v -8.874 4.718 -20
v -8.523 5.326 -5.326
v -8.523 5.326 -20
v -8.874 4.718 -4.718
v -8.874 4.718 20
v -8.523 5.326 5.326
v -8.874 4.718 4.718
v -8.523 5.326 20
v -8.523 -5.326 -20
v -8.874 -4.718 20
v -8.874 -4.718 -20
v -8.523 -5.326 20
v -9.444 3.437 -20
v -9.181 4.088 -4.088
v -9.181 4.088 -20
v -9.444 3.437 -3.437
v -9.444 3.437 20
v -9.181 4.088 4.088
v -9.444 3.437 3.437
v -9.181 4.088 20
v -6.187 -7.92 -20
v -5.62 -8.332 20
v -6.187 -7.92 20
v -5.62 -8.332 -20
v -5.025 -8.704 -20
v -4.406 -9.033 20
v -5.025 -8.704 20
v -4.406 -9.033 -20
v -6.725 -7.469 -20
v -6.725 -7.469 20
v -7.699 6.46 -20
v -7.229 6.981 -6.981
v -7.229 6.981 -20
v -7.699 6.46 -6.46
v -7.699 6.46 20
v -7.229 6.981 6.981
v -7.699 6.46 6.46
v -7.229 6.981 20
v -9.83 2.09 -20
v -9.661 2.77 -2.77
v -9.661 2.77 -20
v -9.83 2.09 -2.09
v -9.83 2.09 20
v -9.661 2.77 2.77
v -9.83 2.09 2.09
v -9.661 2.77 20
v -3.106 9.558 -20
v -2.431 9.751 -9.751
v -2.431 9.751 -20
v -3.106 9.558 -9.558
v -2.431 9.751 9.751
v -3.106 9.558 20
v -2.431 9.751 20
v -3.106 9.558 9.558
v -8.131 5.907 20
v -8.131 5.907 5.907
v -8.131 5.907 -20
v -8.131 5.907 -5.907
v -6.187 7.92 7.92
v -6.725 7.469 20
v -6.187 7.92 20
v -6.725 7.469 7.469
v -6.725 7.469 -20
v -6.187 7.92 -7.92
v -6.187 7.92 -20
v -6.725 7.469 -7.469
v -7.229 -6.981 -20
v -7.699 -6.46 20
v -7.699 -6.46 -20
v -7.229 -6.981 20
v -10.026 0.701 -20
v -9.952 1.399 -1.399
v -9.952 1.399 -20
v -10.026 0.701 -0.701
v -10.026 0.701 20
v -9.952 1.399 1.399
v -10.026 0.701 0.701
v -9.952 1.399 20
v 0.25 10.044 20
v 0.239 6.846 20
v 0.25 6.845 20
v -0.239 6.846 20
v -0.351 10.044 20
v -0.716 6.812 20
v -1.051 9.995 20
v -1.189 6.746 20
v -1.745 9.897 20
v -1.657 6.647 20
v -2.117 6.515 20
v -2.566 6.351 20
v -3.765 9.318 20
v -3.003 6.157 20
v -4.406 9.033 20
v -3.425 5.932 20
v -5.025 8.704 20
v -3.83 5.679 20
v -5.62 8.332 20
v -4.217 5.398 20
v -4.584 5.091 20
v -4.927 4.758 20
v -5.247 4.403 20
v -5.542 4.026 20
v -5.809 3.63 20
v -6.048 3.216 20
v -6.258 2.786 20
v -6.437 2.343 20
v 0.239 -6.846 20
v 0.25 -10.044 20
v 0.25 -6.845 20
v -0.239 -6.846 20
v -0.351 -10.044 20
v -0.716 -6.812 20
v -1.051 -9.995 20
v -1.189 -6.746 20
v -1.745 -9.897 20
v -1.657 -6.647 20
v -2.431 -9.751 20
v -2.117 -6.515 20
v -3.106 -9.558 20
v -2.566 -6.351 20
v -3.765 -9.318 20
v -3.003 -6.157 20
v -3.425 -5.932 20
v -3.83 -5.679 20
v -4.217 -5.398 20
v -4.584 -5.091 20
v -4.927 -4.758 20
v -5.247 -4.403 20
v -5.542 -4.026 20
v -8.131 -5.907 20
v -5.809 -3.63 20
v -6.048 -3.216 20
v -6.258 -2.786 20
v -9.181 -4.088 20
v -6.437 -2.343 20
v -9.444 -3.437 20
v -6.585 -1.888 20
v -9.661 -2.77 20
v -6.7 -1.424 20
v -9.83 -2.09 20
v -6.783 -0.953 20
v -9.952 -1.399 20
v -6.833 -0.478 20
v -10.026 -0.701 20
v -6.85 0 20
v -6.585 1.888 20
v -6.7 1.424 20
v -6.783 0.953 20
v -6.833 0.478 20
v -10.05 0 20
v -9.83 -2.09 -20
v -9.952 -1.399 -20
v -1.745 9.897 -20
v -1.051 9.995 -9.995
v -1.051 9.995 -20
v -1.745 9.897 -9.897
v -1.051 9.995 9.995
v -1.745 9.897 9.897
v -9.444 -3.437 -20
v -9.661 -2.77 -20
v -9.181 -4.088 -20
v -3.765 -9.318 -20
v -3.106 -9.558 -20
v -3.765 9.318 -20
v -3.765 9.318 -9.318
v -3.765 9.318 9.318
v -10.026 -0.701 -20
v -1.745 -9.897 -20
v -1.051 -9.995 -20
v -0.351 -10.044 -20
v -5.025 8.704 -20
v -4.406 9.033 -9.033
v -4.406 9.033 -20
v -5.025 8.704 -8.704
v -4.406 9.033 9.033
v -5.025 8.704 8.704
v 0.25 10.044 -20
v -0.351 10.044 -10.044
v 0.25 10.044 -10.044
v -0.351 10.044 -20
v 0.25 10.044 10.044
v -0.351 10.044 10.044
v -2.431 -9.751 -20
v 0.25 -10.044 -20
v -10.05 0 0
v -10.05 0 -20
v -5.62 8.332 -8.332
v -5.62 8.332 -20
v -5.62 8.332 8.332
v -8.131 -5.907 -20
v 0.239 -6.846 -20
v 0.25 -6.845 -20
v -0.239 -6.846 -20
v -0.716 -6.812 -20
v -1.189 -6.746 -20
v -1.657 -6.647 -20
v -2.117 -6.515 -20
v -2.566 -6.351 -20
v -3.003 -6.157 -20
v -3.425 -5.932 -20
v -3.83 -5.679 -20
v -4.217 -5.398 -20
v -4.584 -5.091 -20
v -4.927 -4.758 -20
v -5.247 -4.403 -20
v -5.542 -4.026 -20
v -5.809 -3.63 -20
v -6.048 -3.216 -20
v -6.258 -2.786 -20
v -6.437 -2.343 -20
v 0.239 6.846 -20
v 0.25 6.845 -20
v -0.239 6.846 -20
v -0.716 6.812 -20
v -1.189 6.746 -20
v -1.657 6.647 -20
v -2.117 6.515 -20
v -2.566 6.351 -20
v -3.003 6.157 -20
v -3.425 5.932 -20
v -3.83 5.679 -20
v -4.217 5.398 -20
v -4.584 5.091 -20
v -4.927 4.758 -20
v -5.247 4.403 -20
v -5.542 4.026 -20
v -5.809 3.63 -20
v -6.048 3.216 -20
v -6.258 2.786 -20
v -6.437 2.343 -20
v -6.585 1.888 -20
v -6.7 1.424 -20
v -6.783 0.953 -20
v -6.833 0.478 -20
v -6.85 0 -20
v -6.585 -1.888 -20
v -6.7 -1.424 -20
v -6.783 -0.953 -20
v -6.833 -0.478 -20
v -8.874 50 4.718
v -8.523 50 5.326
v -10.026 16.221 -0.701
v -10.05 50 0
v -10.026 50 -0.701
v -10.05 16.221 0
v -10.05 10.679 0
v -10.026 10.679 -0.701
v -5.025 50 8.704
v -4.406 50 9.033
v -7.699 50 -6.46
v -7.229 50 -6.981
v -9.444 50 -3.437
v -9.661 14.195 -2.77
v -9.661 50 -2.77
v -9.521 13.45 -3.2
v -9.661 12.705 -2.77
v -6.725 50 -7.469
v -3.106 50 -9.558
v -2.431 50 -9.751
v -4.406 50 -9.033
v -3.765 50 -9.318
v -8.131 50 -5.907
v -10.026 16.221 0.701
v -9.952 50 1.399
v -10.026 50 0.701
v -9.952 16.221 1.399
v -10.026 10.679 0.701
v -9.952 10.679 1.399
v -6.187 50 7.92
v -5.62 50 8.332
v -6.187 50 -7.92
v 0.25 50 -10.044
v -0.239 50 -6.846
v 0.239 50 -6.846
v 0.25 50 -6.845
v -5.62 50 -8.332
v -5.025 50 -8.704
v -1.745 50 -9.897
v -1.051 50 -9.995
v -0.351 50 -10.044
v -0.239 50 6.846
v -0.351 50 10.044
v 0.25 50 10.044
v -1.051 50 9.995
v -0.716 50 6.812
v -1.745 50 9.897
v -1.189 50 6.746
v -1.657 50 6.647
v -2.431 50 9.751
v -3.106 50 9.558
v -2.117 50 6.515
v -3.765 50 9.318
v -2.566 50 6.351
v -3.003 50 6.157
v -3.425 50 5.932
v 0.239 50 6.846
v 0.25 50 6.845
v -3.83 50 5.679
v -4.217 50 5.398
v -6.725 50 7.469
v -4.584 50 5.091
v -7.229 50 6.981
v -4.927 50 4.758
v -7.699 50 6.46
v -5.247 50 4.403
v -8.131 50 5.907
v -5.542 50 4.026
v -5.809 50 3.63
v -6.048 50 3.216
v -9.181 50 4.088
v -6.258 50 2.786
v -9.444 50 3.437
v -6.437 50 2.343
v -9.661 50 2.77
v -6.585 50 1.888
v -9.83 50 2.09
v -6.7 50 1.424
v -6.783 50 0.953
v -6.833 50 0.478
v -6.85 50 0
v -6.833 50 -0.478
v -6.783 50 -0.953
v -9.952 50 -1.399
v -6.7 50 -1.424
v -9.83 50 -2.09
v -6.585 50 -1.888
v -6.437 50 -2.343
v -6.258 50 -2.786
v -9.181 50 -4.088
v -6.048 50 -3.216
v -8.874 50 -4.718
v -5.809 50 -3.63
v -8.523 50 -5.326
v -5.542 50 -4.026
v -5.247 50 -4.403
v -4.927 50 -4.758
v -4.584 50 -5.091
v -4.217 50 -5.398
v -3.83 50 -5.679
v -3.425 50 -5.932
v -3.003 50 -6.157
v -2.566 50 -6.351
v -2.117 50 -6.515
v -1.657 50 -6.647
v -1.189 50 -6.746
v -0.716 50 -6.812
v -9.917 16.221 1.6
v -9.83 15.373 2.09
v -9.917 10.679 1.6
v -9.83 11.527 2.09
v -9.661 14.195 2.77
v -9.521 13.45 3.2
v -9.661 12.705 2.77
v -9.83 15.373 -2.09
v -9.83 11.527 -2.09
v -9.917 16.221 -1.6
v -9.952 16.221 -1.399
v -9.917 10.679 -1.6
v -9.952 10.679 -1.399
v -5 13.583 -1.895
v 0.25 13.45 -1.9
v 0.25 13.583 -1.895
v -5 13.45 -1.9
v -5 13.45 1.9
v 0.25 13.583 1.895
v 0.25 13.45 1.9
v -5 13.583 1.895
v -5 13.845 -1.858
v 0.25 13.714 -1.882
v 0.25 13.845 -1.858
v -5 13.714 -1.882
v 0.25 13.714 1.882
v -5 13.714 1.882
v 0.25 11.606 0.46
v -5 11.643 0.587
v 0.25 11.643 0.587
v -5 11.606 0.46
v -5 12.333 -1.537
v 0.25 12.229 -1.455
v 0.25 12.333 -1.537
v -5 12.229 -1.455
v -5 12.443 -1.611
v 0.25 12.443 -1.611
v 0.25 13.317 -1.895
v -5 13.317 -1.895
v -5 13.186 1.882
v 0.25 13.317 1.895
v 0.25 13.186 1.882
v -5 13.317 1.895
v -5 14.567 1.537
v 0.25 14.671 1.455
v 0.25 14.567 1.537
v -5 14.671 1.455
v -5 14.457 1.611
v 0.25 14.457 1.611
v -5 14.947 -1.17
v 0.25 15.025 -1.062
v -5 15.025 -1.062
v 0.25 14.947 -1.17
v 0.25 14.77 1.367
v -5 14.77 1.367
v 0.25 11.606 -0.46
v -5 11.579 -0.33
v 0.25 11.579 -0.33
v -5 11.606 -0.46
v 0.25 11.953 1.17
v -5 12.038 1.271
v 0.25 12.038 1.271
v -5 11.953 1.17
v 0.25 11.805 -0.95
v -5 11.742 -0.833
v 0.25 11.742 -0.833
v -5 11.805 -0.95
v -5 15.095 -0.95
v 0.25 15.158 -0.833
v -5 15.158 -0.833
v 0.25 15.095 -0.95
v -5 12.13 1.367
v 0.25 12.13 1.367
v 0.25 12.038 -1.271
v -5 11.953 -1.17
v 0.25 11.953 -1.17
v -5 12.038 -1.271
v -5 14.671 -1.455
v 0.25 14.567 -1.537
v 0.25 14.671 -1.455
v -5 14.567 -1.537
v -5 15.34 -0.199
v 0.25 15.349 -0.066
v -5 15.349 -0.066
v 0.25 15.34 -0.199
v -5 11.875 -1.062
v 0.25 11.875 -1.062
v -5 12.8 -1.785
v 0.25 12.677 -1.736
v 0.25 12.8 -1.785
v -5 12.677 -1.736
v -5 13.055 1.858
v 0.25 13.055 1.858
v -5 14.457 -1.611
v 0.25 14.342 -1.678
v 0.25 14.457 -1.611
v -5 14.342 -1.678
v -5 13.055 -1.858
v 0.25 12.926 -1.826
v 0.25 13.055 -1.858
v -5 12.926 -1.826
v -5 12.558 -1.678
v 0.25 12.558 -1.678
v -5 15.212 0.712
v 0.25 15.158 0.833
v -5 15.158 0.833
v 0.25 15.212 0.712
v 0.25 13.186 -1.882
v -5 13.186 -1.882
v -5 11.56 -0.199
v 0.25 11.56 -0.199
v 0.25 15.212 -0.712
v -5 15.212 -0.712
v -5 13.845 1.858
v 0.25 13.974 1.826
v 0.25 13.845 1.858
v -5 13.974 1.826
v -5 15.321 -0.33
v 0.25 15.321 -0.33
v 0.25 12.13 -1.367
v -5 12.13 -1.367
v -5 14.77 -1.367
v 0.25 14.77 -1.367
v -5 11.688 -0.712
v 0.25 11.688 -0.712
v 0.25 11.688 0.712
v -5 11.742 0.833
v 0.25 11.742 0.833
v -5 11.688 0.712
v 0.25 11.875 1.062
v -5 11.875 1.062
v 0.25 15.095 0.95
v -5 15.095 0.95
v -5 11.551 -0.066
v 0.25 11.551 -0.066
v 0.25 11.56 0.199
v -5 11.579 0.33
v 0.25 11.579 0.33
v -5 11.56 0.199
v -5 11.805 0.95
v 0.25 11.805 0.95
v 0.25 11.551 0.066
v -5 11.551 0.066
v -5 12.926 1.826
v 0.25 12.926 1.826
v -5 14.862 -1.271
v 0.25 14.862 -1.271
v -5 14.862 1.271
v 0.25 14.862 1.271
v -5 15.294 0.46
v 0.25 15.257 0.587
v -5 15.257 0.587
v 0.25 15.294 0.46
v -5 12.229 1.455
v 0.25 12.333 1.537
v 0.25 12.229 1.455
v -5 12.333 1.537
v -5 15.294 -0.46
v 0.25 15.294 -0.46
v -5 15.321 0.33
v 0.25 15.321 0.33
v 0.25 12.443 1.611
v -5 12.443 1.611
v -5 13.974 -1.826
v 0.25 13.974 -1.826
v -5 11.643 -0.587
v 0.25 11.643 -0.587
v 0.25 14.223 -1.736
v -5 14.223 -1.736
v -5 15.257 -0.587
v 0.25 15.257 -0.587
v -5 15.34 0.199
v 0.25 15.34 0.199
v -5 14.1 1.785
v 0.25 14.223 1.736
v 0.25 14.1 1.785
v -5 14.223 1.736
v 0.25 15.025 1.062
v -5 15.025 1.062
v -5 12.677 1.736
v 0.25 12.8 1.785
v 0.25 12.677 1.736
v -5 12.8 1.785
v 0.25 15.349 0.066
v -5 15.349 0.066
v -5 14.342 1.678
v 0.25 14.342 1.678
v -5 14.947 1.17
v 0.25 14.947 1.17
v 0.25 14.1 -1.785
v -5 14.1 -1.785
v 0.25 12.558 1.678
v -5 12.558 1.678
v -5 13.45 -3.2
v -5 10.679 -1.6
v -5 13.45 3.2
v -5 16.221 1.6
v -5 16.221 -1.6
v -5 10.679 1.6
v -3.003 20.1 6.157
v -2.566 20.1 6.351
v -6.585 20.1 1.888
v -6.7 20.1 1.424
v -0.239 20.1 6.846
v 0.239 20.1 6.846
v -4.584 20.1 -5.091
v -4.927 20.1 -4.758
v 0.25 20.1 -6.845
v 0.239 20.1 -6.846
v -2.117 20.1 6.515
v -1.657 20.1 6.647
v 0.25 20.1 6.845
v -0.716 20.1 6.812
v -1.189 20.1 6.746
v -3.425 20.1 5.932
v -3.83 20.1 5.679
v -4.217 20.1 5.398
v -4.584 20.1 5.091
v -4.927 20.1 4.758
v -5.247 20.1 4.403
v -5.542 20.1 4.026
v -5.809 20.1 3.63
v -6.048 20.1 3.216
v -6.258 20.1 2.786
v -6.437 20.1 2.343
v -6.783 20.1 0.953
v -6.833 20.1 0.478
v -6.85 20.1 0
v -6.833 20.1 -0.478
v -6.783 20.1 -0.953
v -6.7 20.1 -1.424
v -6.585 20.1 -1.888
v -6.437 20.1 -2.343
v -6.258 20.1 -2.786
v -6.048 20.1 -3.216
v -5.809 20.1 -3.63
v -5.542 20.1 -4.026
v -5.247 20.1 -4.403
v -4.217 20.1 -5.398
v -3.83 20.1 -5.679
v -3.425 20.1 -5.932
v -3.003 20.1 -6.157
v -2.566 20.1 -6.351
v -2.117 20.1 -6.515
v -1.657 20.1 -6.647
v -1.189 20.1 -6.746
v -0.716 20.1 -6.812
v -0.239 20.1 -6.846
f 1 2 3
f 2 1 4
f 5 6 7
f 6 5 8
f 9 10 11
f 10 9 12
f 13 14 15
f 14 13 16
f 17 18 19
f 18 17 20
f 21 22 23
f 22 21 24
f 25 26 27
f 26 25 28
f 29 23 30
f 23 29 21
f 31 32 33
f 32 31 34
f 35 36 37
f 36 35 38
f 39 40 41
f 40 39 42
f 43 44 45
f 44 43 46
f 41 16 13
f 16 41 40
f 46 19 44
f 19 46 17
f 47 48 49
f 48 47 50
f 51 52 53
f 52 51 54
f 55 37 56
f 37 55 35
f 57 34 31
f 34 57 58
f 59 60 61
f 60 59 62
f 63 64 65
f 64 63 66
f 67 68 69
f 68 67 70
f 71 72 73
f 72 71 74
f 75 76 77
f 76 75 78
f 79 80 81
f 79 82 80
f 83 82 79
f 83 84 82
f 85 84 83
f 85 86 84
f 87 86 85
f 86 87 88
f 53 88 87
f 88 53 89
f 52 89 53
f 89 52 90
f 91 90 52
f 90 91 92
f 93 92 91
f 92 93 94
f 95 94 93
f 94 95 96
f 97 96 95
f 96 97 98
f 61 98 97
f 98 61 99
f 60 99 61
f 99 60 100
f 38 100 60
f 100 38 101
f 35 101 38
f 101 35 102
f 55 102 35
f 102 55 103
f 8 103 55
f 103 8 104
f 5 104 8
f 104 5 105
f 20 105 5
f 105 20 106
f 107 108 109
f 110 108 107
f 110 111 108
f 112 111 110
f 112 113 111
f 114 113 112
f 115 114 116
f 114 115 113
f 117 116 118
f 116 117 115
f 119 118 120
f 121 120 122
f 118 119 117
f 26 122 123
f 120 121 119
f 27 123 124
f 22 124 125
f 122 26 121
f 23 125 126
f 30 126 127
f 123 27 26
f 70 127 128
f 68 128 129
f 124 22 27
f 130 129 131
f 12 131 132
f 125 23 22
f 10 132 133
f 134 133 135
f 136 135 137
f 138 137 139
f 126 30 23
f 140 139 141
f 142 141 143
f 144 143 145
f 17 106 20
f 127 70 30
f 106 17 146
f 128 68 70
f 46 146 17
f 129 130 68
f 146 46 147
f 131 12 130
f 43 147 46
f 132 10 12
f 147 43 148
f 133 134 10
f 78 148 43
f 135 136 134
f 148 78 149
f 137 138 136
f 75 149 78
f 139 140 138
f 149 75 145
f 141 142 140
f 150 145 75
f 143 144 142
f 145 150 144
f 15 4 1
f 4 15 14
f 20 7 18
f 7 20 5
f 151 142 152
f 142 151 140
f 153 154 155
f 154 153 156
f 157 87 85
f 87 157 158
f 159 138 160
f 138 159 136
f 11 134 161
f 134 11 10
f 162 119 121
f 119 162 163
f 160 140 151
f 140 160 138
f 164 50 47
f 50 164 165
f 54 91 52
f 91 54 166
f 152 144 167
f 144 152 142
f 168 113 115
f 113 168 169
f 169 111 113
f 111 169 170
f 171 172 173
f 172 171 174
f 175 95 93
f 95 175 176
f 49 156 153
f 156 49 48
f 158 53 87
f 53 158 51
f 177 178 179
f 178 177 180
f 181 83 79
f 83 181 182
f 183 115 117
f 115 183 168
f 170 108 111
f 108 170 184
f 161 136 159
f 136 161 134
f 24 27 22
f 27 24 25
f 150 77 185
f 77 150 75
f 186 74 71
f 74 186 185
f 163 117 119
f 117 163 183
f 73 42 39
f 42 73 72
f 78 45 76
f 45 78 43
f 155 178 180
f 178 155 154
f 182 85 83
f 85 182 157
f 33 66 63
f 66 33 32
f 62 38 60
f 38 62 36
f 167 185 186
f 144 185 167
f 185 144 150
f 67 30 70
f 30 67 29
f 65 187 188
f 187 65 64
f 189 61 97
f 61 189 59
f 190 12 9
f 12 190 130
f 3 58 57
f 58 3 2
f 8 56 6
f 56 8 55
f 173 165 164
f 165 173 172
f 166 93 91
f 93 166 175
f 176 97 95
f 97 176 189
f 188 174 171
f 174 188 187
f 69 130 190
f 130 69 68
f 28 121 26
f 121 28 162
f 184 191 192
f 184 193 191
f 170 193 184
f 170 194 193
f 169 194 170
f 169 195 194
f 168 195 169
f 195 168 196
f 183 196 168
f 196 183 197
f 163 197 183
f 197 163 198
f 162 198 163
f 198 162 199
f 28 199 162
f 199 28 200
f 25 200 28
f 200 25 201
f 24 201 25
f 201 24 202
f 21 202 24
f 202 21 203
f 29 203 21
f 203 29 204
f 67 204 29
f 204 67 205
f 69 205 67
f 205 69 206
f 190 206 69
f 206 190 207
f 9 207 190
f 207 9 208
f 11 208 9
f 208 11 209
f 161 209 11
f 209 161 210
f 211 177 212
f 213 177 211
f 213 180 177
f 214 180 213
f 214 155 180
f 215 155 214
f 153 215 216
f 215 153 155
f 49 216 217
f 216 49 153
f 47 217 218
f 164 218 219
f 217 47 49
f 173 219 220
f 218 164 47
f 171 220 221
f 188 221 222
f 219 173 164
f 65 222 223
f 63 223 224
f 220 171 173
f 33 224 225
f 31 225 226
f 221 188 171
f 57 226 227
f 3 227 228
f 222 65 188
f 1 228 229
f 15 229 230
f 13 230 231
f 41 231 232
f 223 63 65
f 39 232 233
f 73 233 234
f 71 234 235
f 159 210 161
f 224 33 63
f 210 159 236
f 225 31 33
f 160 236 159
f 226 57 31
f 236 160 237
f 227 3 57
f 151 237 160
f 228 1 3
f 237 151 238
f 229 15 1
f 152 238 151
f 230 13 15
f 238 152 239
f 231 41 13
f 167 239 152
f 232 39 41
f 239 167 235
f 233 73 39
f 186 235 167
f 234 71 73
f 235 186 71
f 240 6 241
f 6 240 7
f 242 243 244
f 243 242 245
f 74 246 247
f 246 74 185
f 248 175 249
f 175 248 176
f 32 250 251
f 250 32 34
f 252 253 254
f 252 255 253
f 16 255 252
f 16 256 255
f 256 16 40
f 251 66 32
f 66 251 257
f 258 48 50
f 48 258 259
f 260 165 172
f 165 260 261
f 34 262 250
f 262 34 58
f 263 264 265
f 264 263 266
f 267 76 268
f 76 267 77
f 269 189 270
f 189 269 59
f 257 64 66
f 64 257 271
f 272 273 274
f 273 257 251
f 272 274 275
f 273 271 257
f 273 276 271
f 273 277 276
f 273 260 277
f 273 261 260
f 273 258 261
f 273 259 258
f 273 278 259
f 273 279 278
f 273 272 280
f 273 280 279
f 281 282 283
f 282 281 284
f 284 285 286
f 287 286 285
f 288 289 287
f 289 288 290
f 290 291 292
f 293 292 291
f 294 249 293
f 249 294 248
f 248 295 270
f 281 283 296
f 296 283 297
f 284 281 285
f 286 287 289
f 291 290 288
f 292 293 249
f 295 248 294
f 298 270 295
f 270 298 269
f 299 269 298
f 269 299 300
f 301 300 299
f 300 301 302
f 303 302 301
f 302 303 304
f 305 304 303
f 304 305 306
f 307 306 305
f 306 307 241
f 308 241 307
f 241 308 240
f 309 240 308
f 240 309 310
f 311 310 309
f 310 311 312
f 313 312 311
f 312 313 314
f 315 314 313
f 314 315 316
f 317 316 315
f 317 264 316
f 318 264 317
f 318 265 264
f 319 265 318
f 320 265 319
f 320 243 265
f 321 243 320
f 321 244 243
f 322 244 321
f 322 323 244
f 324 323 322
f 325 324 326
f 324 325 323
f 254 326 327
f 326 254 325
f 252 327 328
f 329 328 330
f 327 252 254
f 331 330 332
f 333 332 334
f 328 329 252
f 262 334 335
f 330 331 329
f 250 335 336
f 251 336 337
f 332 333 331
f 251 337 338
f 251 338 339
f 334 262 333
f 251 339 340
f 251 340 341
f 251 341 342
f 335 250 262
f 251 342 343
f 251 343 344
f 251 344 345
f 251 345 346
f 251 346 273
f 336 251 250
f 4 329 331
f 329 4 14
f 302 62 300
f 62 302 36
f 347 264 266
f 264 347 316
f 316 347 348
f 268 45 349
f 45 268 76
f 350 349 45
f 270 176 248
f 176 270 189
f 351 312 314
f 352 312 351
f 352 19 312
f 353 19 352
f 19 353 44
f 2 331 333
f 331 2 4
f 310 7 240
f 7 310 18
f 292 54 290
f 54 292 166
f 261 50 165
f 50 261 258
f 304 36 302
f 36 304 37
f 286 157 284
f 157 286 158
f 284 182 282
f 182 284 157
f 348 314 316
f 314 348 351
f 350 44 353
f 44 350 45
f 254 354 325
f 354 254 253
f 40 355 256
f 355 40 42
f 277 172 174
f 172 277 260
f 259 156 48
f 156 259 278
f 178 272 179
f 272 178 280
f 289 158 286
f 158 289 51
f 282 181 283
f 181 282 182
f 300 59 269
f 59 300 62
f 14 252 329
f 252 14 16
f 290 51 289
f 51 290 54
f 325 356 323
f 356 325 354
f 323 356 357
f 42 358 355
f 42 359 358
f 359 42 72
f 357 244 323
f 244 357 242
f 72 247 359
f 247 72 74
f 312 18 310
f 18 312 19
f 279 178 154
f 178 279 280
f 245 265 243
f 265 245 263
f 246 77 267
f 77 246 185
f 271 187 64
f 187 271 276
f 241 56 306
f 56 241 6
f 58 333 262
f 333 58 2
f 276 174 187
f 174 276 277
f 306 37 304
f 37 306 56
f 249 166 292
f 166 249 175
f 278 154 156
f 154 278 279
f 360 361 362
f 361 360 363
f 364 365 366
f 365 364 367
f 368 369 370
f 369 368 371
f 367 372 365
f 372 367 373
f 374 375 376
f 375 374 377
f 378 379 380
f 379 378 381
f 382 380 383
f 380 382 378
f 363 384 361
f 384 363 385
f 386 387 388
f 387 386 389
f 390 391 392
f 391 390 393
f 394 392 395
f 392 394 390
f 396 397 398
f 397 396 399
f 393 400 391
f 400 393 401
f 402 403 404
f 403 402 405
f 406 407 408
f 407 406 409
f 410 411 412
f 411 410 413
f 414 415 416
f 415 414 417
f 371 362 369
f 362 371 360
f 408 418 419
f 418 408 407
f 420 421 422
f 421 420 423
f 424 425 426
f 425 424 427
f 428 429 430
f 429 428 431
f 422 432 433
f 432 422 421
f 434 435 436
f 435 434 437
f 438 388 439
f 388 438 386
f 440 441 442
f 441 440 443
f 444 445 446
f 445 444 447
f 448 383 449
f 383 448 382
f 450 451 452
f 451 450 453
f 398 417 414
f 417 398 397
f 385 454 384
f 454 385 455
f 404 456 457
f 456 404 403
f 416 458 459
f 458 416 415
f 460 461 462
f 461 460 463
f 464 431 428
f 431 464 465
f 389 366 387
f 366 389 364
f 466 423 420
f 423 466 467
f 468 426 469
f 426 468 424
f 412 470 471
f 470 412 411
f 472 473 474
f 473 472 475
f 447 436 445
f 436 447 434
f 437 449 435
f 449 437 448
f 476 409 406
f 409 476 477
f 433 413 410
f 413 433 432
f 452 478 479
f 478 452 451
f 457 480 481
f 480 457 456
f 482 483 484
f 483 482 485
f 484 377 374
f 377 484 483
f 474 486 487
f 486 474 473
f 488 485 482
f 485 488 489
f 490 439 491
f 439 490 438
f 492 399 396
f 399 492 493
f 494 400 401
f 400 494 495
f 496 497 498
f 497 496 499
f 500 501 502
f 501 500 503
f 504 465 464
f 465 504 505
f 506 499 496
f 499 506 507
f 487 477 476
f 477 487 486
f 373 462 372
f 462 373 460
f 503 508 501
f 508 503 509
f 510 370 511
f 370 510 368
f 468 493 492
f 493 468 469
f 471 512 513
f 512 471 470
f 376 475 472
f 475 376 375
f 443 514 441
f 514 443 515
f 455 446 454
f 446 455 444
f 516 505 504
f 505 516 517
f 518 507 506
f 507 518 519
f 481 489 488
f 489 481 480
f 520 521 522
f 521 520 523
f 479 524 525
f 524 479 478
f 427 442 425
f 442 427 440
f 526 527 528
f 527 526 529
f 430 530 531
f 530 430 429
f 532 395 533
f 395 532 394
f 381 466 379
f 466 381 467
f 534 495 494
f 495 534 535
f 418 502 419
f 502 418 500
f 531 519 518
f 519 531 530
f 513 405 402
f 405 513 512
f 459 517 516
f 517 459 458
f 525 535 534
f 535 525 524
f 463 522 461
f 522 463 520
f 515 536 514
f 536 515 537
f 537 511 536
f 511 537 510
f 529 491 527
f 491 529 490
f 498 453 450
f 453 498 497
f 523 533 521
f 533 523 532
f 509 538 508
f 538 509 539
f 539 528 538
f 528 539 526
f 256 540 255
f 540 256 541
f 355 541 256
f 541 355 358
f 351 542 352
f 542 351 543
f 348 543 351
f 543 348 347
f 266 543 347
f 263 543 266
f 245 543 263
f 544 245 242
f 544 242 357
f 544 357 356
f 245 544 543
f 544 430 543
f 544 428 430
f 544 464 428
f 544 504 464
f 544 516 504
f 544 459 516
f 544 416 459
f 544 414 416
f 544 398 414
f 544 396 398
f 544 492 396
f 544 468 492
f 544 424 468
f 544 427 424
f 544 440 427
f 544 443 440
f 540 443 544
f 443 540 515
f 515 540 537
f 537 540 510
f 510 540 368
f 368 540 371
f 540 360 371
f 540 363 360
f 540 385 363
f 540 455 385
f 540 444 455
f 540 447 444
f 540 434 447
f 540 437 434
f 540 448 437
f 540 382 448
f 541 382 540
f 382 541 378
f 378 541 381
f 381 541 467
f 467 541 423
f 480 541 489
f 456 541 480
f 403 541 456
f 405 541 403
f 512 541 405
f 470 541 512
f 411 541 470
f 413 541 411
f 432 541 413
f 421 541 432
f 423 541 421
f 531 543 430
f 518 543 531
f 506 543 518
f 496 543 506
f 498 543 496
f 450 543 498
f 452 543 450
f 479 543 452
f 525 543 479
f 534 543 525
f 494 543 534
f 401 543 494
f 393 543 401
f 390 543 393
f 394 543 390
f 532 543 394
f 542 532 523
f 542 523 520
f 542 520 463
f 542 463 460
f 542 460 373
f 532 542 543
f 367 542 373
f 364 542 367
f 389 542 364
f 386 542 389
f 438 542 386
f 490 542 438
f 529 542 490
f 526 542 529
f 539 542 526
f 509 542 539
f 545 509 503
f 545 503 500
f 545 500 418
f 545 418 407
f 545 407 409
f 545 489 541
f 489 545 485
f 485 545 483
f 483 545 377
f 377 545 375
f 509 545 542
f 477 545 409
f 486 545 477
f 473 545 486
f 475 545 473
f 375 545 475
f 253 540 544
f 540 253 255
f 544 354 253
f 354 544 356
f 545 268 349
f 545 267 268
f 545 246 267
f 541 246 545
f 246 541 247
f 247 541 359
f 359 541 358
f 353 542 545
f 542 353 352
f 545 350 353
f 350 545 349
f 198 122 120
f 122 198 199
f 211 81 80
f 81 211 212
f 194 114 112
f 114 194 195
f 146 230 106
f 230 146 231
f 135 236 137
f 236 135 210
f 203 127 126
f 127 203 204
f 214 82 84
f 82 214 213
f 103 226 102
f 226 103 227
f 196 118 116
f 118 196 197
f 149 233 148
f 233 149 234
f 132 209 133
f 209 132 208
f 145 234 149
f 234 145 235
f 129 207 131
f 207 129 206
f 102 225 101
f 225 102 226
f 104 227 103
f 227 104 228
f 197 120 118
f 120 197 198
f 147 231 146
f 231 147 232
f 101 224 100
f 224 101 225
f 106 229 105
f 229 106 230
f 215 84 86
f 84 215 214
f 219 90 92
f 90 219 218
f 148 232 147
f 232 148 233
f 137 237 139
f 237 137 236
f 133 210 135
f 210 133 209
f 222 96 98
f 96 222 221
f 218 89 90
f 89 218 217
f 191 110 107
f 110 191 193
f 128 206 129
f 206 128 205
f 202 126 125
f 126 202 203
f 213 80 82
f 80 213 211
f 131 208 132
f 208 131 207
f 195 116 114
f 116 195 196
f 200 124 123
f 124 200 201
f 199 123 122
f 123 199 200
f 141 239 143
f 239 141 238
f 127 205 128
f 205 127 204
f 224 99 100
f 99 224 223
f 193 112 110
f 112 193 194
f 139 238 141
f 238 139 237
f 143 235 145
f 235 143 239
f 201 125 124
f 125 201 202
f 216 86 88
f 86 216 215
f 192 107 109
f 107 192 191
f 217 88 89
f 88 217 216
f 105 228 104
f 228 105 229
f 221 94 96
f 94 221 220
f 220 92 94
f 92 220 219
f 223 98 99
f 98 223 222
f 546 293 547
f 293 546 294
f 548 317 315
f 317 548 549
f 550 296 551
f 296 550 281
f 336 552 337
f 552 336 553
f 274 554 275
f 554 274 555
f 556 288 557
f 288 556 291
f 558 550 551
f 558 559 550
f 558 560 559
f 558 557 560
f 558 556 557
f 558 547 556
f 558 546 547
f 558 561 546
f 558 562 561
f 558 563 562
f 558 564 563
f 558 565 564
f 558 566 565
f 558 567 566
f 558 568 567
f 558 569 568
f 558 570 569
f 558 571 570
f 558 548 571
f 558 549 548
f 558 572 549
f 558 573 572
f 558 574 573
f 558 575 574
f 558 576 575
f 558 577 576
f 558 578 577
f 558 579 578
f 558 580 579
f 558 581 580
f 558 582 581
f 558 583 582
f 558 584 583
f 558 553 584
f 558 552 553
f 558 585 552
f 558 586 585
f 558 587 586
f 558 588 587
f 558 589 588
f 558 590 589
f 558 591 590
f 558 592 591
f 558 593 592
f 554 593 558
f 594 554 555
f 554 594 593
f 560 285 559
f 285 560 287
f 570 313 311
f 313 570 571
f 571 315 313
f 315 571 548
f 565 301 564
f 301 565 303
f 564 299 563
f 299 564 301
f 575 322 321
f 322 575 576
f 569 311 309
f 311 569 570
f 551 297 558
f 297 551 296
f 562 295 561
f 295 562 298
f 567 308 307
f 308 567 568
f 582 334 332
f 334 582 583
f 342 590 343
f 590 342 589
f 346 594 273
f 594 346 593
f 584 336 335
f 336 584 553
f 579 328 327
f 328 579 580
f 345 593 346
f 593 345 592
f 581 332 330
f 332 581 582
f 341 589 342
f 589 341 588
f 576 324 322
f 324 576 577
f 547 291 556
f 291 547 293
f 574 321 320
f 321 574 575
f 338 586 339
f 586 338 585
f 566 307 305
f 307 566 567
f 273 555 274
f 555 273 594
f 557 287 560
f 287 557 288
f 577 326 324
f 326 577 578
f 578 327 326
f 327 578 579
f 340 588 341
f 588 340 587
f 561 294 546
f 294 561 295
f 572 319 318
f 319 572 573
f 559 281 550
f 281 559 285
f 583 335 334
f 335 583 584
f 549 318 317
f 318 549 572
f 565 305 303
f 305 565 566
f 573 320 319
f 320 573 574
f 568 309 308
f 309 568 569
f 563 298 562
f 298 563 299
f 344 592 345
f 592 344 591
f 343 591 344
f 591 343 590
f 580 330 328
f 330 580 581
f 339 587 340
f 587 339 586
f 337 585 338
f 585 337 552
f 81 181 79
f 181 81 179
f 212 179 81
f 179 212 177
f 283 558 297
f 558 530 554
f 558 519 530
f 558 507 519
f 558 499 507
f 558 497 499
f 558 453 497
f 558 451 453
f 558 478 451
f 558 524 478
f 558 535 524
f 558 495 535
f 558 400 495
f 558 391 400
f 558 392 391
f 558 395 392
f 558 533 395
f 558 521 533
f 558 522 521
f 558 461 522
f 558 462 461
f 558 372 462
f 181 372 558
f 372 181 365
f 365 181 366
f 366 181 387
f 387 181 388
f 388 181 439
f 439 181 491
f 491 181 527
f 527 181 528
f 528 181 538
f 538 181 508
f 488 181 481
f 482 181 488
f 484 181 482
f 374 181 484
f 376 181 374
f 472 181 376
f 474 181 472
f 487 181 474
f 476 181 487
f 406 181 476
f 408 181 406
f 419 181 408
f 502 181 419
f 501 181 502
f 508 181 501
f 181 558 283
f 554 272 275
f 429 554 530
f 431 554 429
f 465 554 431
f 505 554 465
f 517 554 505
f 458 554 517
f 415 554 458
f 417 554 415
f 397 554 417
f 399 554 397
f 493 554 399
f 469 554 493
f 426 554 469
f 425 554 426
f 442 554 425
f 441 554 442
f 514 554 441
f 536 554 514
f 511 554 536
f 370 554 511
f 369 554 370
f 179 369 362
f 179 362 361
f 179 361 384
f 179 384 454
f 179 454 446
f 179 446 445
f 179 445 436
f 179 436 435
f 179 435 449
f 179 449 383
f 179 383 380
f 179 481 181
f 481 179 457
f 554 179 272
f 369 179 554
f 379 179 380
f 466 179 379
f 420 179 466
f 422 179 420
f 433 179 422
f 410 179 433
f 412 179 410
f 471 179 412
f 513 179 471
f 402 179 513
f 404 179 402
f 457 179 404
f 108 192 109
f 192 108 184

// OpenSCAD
$fa=4; // default minimum facet angle is now 0.5
$fs=0.05; // default minimum facet size is now 0.05 mm

tolerance = .1;

clampGap = .25;
pipeRad = 6.75 + tolerance;
insertDepth = 30;
totalLen = 40;
groundHeight = 14;
wallThickness = 3.2;
joinAreaWidth = 10;

screwHeadExtraGap = .75;
screwRad = 1.5 + 4 * tolerance;
screwHeadRad = 2.25 + screwHeadExtraGap;
nutRad = 3.1 + tolerance;

mirror([0, 1, 0]) {
  difference() {
    union() {
      cylinder(h = totalLen, r = pipeRad + wallThickness, center = true);
      rotate([90, 0, 0]) cylinder(h = totalLen + joinAreaWidth, r = pipeRad + wallThickness);
    }

    union() {
      cylinder(h = totalLen + .2, r = pipeRad, center=true);
      translate([0, insertDepth - totalLen - joinAreaWidth -.1, 0]) rotate([90, 0, 0]) cylinder(h = insertDepth + .1, r = pipeRad);
      translate([clampGap, -60, -60]) cube([20, 120, 120]);
      translate([0, -(pipeRad + (joinAreaWidth + wallThickness) / 2), 0]) {
        rotate([0, 90, 0]) cylinder(h = 50, r = screwRad, center=true);
        translate([-5, 0, 0]) rotate([0, -90, 0]) linear_extrude(50) hexagon(nutRad);
      } 
    }
  }
}

module hexagon(r = 1) {
  polygon([
    [-1 * r, 0],
    [-.5 * r, r * sqrt(3) / 2],
    [.5 * r, r * sqrt(3) / 2],
    [1 * r, 0],
    [.5 * r, r * sqrt(3) / -2],
    [-.5 * r, r * sqrt(3) / -2],
  ]);
}
